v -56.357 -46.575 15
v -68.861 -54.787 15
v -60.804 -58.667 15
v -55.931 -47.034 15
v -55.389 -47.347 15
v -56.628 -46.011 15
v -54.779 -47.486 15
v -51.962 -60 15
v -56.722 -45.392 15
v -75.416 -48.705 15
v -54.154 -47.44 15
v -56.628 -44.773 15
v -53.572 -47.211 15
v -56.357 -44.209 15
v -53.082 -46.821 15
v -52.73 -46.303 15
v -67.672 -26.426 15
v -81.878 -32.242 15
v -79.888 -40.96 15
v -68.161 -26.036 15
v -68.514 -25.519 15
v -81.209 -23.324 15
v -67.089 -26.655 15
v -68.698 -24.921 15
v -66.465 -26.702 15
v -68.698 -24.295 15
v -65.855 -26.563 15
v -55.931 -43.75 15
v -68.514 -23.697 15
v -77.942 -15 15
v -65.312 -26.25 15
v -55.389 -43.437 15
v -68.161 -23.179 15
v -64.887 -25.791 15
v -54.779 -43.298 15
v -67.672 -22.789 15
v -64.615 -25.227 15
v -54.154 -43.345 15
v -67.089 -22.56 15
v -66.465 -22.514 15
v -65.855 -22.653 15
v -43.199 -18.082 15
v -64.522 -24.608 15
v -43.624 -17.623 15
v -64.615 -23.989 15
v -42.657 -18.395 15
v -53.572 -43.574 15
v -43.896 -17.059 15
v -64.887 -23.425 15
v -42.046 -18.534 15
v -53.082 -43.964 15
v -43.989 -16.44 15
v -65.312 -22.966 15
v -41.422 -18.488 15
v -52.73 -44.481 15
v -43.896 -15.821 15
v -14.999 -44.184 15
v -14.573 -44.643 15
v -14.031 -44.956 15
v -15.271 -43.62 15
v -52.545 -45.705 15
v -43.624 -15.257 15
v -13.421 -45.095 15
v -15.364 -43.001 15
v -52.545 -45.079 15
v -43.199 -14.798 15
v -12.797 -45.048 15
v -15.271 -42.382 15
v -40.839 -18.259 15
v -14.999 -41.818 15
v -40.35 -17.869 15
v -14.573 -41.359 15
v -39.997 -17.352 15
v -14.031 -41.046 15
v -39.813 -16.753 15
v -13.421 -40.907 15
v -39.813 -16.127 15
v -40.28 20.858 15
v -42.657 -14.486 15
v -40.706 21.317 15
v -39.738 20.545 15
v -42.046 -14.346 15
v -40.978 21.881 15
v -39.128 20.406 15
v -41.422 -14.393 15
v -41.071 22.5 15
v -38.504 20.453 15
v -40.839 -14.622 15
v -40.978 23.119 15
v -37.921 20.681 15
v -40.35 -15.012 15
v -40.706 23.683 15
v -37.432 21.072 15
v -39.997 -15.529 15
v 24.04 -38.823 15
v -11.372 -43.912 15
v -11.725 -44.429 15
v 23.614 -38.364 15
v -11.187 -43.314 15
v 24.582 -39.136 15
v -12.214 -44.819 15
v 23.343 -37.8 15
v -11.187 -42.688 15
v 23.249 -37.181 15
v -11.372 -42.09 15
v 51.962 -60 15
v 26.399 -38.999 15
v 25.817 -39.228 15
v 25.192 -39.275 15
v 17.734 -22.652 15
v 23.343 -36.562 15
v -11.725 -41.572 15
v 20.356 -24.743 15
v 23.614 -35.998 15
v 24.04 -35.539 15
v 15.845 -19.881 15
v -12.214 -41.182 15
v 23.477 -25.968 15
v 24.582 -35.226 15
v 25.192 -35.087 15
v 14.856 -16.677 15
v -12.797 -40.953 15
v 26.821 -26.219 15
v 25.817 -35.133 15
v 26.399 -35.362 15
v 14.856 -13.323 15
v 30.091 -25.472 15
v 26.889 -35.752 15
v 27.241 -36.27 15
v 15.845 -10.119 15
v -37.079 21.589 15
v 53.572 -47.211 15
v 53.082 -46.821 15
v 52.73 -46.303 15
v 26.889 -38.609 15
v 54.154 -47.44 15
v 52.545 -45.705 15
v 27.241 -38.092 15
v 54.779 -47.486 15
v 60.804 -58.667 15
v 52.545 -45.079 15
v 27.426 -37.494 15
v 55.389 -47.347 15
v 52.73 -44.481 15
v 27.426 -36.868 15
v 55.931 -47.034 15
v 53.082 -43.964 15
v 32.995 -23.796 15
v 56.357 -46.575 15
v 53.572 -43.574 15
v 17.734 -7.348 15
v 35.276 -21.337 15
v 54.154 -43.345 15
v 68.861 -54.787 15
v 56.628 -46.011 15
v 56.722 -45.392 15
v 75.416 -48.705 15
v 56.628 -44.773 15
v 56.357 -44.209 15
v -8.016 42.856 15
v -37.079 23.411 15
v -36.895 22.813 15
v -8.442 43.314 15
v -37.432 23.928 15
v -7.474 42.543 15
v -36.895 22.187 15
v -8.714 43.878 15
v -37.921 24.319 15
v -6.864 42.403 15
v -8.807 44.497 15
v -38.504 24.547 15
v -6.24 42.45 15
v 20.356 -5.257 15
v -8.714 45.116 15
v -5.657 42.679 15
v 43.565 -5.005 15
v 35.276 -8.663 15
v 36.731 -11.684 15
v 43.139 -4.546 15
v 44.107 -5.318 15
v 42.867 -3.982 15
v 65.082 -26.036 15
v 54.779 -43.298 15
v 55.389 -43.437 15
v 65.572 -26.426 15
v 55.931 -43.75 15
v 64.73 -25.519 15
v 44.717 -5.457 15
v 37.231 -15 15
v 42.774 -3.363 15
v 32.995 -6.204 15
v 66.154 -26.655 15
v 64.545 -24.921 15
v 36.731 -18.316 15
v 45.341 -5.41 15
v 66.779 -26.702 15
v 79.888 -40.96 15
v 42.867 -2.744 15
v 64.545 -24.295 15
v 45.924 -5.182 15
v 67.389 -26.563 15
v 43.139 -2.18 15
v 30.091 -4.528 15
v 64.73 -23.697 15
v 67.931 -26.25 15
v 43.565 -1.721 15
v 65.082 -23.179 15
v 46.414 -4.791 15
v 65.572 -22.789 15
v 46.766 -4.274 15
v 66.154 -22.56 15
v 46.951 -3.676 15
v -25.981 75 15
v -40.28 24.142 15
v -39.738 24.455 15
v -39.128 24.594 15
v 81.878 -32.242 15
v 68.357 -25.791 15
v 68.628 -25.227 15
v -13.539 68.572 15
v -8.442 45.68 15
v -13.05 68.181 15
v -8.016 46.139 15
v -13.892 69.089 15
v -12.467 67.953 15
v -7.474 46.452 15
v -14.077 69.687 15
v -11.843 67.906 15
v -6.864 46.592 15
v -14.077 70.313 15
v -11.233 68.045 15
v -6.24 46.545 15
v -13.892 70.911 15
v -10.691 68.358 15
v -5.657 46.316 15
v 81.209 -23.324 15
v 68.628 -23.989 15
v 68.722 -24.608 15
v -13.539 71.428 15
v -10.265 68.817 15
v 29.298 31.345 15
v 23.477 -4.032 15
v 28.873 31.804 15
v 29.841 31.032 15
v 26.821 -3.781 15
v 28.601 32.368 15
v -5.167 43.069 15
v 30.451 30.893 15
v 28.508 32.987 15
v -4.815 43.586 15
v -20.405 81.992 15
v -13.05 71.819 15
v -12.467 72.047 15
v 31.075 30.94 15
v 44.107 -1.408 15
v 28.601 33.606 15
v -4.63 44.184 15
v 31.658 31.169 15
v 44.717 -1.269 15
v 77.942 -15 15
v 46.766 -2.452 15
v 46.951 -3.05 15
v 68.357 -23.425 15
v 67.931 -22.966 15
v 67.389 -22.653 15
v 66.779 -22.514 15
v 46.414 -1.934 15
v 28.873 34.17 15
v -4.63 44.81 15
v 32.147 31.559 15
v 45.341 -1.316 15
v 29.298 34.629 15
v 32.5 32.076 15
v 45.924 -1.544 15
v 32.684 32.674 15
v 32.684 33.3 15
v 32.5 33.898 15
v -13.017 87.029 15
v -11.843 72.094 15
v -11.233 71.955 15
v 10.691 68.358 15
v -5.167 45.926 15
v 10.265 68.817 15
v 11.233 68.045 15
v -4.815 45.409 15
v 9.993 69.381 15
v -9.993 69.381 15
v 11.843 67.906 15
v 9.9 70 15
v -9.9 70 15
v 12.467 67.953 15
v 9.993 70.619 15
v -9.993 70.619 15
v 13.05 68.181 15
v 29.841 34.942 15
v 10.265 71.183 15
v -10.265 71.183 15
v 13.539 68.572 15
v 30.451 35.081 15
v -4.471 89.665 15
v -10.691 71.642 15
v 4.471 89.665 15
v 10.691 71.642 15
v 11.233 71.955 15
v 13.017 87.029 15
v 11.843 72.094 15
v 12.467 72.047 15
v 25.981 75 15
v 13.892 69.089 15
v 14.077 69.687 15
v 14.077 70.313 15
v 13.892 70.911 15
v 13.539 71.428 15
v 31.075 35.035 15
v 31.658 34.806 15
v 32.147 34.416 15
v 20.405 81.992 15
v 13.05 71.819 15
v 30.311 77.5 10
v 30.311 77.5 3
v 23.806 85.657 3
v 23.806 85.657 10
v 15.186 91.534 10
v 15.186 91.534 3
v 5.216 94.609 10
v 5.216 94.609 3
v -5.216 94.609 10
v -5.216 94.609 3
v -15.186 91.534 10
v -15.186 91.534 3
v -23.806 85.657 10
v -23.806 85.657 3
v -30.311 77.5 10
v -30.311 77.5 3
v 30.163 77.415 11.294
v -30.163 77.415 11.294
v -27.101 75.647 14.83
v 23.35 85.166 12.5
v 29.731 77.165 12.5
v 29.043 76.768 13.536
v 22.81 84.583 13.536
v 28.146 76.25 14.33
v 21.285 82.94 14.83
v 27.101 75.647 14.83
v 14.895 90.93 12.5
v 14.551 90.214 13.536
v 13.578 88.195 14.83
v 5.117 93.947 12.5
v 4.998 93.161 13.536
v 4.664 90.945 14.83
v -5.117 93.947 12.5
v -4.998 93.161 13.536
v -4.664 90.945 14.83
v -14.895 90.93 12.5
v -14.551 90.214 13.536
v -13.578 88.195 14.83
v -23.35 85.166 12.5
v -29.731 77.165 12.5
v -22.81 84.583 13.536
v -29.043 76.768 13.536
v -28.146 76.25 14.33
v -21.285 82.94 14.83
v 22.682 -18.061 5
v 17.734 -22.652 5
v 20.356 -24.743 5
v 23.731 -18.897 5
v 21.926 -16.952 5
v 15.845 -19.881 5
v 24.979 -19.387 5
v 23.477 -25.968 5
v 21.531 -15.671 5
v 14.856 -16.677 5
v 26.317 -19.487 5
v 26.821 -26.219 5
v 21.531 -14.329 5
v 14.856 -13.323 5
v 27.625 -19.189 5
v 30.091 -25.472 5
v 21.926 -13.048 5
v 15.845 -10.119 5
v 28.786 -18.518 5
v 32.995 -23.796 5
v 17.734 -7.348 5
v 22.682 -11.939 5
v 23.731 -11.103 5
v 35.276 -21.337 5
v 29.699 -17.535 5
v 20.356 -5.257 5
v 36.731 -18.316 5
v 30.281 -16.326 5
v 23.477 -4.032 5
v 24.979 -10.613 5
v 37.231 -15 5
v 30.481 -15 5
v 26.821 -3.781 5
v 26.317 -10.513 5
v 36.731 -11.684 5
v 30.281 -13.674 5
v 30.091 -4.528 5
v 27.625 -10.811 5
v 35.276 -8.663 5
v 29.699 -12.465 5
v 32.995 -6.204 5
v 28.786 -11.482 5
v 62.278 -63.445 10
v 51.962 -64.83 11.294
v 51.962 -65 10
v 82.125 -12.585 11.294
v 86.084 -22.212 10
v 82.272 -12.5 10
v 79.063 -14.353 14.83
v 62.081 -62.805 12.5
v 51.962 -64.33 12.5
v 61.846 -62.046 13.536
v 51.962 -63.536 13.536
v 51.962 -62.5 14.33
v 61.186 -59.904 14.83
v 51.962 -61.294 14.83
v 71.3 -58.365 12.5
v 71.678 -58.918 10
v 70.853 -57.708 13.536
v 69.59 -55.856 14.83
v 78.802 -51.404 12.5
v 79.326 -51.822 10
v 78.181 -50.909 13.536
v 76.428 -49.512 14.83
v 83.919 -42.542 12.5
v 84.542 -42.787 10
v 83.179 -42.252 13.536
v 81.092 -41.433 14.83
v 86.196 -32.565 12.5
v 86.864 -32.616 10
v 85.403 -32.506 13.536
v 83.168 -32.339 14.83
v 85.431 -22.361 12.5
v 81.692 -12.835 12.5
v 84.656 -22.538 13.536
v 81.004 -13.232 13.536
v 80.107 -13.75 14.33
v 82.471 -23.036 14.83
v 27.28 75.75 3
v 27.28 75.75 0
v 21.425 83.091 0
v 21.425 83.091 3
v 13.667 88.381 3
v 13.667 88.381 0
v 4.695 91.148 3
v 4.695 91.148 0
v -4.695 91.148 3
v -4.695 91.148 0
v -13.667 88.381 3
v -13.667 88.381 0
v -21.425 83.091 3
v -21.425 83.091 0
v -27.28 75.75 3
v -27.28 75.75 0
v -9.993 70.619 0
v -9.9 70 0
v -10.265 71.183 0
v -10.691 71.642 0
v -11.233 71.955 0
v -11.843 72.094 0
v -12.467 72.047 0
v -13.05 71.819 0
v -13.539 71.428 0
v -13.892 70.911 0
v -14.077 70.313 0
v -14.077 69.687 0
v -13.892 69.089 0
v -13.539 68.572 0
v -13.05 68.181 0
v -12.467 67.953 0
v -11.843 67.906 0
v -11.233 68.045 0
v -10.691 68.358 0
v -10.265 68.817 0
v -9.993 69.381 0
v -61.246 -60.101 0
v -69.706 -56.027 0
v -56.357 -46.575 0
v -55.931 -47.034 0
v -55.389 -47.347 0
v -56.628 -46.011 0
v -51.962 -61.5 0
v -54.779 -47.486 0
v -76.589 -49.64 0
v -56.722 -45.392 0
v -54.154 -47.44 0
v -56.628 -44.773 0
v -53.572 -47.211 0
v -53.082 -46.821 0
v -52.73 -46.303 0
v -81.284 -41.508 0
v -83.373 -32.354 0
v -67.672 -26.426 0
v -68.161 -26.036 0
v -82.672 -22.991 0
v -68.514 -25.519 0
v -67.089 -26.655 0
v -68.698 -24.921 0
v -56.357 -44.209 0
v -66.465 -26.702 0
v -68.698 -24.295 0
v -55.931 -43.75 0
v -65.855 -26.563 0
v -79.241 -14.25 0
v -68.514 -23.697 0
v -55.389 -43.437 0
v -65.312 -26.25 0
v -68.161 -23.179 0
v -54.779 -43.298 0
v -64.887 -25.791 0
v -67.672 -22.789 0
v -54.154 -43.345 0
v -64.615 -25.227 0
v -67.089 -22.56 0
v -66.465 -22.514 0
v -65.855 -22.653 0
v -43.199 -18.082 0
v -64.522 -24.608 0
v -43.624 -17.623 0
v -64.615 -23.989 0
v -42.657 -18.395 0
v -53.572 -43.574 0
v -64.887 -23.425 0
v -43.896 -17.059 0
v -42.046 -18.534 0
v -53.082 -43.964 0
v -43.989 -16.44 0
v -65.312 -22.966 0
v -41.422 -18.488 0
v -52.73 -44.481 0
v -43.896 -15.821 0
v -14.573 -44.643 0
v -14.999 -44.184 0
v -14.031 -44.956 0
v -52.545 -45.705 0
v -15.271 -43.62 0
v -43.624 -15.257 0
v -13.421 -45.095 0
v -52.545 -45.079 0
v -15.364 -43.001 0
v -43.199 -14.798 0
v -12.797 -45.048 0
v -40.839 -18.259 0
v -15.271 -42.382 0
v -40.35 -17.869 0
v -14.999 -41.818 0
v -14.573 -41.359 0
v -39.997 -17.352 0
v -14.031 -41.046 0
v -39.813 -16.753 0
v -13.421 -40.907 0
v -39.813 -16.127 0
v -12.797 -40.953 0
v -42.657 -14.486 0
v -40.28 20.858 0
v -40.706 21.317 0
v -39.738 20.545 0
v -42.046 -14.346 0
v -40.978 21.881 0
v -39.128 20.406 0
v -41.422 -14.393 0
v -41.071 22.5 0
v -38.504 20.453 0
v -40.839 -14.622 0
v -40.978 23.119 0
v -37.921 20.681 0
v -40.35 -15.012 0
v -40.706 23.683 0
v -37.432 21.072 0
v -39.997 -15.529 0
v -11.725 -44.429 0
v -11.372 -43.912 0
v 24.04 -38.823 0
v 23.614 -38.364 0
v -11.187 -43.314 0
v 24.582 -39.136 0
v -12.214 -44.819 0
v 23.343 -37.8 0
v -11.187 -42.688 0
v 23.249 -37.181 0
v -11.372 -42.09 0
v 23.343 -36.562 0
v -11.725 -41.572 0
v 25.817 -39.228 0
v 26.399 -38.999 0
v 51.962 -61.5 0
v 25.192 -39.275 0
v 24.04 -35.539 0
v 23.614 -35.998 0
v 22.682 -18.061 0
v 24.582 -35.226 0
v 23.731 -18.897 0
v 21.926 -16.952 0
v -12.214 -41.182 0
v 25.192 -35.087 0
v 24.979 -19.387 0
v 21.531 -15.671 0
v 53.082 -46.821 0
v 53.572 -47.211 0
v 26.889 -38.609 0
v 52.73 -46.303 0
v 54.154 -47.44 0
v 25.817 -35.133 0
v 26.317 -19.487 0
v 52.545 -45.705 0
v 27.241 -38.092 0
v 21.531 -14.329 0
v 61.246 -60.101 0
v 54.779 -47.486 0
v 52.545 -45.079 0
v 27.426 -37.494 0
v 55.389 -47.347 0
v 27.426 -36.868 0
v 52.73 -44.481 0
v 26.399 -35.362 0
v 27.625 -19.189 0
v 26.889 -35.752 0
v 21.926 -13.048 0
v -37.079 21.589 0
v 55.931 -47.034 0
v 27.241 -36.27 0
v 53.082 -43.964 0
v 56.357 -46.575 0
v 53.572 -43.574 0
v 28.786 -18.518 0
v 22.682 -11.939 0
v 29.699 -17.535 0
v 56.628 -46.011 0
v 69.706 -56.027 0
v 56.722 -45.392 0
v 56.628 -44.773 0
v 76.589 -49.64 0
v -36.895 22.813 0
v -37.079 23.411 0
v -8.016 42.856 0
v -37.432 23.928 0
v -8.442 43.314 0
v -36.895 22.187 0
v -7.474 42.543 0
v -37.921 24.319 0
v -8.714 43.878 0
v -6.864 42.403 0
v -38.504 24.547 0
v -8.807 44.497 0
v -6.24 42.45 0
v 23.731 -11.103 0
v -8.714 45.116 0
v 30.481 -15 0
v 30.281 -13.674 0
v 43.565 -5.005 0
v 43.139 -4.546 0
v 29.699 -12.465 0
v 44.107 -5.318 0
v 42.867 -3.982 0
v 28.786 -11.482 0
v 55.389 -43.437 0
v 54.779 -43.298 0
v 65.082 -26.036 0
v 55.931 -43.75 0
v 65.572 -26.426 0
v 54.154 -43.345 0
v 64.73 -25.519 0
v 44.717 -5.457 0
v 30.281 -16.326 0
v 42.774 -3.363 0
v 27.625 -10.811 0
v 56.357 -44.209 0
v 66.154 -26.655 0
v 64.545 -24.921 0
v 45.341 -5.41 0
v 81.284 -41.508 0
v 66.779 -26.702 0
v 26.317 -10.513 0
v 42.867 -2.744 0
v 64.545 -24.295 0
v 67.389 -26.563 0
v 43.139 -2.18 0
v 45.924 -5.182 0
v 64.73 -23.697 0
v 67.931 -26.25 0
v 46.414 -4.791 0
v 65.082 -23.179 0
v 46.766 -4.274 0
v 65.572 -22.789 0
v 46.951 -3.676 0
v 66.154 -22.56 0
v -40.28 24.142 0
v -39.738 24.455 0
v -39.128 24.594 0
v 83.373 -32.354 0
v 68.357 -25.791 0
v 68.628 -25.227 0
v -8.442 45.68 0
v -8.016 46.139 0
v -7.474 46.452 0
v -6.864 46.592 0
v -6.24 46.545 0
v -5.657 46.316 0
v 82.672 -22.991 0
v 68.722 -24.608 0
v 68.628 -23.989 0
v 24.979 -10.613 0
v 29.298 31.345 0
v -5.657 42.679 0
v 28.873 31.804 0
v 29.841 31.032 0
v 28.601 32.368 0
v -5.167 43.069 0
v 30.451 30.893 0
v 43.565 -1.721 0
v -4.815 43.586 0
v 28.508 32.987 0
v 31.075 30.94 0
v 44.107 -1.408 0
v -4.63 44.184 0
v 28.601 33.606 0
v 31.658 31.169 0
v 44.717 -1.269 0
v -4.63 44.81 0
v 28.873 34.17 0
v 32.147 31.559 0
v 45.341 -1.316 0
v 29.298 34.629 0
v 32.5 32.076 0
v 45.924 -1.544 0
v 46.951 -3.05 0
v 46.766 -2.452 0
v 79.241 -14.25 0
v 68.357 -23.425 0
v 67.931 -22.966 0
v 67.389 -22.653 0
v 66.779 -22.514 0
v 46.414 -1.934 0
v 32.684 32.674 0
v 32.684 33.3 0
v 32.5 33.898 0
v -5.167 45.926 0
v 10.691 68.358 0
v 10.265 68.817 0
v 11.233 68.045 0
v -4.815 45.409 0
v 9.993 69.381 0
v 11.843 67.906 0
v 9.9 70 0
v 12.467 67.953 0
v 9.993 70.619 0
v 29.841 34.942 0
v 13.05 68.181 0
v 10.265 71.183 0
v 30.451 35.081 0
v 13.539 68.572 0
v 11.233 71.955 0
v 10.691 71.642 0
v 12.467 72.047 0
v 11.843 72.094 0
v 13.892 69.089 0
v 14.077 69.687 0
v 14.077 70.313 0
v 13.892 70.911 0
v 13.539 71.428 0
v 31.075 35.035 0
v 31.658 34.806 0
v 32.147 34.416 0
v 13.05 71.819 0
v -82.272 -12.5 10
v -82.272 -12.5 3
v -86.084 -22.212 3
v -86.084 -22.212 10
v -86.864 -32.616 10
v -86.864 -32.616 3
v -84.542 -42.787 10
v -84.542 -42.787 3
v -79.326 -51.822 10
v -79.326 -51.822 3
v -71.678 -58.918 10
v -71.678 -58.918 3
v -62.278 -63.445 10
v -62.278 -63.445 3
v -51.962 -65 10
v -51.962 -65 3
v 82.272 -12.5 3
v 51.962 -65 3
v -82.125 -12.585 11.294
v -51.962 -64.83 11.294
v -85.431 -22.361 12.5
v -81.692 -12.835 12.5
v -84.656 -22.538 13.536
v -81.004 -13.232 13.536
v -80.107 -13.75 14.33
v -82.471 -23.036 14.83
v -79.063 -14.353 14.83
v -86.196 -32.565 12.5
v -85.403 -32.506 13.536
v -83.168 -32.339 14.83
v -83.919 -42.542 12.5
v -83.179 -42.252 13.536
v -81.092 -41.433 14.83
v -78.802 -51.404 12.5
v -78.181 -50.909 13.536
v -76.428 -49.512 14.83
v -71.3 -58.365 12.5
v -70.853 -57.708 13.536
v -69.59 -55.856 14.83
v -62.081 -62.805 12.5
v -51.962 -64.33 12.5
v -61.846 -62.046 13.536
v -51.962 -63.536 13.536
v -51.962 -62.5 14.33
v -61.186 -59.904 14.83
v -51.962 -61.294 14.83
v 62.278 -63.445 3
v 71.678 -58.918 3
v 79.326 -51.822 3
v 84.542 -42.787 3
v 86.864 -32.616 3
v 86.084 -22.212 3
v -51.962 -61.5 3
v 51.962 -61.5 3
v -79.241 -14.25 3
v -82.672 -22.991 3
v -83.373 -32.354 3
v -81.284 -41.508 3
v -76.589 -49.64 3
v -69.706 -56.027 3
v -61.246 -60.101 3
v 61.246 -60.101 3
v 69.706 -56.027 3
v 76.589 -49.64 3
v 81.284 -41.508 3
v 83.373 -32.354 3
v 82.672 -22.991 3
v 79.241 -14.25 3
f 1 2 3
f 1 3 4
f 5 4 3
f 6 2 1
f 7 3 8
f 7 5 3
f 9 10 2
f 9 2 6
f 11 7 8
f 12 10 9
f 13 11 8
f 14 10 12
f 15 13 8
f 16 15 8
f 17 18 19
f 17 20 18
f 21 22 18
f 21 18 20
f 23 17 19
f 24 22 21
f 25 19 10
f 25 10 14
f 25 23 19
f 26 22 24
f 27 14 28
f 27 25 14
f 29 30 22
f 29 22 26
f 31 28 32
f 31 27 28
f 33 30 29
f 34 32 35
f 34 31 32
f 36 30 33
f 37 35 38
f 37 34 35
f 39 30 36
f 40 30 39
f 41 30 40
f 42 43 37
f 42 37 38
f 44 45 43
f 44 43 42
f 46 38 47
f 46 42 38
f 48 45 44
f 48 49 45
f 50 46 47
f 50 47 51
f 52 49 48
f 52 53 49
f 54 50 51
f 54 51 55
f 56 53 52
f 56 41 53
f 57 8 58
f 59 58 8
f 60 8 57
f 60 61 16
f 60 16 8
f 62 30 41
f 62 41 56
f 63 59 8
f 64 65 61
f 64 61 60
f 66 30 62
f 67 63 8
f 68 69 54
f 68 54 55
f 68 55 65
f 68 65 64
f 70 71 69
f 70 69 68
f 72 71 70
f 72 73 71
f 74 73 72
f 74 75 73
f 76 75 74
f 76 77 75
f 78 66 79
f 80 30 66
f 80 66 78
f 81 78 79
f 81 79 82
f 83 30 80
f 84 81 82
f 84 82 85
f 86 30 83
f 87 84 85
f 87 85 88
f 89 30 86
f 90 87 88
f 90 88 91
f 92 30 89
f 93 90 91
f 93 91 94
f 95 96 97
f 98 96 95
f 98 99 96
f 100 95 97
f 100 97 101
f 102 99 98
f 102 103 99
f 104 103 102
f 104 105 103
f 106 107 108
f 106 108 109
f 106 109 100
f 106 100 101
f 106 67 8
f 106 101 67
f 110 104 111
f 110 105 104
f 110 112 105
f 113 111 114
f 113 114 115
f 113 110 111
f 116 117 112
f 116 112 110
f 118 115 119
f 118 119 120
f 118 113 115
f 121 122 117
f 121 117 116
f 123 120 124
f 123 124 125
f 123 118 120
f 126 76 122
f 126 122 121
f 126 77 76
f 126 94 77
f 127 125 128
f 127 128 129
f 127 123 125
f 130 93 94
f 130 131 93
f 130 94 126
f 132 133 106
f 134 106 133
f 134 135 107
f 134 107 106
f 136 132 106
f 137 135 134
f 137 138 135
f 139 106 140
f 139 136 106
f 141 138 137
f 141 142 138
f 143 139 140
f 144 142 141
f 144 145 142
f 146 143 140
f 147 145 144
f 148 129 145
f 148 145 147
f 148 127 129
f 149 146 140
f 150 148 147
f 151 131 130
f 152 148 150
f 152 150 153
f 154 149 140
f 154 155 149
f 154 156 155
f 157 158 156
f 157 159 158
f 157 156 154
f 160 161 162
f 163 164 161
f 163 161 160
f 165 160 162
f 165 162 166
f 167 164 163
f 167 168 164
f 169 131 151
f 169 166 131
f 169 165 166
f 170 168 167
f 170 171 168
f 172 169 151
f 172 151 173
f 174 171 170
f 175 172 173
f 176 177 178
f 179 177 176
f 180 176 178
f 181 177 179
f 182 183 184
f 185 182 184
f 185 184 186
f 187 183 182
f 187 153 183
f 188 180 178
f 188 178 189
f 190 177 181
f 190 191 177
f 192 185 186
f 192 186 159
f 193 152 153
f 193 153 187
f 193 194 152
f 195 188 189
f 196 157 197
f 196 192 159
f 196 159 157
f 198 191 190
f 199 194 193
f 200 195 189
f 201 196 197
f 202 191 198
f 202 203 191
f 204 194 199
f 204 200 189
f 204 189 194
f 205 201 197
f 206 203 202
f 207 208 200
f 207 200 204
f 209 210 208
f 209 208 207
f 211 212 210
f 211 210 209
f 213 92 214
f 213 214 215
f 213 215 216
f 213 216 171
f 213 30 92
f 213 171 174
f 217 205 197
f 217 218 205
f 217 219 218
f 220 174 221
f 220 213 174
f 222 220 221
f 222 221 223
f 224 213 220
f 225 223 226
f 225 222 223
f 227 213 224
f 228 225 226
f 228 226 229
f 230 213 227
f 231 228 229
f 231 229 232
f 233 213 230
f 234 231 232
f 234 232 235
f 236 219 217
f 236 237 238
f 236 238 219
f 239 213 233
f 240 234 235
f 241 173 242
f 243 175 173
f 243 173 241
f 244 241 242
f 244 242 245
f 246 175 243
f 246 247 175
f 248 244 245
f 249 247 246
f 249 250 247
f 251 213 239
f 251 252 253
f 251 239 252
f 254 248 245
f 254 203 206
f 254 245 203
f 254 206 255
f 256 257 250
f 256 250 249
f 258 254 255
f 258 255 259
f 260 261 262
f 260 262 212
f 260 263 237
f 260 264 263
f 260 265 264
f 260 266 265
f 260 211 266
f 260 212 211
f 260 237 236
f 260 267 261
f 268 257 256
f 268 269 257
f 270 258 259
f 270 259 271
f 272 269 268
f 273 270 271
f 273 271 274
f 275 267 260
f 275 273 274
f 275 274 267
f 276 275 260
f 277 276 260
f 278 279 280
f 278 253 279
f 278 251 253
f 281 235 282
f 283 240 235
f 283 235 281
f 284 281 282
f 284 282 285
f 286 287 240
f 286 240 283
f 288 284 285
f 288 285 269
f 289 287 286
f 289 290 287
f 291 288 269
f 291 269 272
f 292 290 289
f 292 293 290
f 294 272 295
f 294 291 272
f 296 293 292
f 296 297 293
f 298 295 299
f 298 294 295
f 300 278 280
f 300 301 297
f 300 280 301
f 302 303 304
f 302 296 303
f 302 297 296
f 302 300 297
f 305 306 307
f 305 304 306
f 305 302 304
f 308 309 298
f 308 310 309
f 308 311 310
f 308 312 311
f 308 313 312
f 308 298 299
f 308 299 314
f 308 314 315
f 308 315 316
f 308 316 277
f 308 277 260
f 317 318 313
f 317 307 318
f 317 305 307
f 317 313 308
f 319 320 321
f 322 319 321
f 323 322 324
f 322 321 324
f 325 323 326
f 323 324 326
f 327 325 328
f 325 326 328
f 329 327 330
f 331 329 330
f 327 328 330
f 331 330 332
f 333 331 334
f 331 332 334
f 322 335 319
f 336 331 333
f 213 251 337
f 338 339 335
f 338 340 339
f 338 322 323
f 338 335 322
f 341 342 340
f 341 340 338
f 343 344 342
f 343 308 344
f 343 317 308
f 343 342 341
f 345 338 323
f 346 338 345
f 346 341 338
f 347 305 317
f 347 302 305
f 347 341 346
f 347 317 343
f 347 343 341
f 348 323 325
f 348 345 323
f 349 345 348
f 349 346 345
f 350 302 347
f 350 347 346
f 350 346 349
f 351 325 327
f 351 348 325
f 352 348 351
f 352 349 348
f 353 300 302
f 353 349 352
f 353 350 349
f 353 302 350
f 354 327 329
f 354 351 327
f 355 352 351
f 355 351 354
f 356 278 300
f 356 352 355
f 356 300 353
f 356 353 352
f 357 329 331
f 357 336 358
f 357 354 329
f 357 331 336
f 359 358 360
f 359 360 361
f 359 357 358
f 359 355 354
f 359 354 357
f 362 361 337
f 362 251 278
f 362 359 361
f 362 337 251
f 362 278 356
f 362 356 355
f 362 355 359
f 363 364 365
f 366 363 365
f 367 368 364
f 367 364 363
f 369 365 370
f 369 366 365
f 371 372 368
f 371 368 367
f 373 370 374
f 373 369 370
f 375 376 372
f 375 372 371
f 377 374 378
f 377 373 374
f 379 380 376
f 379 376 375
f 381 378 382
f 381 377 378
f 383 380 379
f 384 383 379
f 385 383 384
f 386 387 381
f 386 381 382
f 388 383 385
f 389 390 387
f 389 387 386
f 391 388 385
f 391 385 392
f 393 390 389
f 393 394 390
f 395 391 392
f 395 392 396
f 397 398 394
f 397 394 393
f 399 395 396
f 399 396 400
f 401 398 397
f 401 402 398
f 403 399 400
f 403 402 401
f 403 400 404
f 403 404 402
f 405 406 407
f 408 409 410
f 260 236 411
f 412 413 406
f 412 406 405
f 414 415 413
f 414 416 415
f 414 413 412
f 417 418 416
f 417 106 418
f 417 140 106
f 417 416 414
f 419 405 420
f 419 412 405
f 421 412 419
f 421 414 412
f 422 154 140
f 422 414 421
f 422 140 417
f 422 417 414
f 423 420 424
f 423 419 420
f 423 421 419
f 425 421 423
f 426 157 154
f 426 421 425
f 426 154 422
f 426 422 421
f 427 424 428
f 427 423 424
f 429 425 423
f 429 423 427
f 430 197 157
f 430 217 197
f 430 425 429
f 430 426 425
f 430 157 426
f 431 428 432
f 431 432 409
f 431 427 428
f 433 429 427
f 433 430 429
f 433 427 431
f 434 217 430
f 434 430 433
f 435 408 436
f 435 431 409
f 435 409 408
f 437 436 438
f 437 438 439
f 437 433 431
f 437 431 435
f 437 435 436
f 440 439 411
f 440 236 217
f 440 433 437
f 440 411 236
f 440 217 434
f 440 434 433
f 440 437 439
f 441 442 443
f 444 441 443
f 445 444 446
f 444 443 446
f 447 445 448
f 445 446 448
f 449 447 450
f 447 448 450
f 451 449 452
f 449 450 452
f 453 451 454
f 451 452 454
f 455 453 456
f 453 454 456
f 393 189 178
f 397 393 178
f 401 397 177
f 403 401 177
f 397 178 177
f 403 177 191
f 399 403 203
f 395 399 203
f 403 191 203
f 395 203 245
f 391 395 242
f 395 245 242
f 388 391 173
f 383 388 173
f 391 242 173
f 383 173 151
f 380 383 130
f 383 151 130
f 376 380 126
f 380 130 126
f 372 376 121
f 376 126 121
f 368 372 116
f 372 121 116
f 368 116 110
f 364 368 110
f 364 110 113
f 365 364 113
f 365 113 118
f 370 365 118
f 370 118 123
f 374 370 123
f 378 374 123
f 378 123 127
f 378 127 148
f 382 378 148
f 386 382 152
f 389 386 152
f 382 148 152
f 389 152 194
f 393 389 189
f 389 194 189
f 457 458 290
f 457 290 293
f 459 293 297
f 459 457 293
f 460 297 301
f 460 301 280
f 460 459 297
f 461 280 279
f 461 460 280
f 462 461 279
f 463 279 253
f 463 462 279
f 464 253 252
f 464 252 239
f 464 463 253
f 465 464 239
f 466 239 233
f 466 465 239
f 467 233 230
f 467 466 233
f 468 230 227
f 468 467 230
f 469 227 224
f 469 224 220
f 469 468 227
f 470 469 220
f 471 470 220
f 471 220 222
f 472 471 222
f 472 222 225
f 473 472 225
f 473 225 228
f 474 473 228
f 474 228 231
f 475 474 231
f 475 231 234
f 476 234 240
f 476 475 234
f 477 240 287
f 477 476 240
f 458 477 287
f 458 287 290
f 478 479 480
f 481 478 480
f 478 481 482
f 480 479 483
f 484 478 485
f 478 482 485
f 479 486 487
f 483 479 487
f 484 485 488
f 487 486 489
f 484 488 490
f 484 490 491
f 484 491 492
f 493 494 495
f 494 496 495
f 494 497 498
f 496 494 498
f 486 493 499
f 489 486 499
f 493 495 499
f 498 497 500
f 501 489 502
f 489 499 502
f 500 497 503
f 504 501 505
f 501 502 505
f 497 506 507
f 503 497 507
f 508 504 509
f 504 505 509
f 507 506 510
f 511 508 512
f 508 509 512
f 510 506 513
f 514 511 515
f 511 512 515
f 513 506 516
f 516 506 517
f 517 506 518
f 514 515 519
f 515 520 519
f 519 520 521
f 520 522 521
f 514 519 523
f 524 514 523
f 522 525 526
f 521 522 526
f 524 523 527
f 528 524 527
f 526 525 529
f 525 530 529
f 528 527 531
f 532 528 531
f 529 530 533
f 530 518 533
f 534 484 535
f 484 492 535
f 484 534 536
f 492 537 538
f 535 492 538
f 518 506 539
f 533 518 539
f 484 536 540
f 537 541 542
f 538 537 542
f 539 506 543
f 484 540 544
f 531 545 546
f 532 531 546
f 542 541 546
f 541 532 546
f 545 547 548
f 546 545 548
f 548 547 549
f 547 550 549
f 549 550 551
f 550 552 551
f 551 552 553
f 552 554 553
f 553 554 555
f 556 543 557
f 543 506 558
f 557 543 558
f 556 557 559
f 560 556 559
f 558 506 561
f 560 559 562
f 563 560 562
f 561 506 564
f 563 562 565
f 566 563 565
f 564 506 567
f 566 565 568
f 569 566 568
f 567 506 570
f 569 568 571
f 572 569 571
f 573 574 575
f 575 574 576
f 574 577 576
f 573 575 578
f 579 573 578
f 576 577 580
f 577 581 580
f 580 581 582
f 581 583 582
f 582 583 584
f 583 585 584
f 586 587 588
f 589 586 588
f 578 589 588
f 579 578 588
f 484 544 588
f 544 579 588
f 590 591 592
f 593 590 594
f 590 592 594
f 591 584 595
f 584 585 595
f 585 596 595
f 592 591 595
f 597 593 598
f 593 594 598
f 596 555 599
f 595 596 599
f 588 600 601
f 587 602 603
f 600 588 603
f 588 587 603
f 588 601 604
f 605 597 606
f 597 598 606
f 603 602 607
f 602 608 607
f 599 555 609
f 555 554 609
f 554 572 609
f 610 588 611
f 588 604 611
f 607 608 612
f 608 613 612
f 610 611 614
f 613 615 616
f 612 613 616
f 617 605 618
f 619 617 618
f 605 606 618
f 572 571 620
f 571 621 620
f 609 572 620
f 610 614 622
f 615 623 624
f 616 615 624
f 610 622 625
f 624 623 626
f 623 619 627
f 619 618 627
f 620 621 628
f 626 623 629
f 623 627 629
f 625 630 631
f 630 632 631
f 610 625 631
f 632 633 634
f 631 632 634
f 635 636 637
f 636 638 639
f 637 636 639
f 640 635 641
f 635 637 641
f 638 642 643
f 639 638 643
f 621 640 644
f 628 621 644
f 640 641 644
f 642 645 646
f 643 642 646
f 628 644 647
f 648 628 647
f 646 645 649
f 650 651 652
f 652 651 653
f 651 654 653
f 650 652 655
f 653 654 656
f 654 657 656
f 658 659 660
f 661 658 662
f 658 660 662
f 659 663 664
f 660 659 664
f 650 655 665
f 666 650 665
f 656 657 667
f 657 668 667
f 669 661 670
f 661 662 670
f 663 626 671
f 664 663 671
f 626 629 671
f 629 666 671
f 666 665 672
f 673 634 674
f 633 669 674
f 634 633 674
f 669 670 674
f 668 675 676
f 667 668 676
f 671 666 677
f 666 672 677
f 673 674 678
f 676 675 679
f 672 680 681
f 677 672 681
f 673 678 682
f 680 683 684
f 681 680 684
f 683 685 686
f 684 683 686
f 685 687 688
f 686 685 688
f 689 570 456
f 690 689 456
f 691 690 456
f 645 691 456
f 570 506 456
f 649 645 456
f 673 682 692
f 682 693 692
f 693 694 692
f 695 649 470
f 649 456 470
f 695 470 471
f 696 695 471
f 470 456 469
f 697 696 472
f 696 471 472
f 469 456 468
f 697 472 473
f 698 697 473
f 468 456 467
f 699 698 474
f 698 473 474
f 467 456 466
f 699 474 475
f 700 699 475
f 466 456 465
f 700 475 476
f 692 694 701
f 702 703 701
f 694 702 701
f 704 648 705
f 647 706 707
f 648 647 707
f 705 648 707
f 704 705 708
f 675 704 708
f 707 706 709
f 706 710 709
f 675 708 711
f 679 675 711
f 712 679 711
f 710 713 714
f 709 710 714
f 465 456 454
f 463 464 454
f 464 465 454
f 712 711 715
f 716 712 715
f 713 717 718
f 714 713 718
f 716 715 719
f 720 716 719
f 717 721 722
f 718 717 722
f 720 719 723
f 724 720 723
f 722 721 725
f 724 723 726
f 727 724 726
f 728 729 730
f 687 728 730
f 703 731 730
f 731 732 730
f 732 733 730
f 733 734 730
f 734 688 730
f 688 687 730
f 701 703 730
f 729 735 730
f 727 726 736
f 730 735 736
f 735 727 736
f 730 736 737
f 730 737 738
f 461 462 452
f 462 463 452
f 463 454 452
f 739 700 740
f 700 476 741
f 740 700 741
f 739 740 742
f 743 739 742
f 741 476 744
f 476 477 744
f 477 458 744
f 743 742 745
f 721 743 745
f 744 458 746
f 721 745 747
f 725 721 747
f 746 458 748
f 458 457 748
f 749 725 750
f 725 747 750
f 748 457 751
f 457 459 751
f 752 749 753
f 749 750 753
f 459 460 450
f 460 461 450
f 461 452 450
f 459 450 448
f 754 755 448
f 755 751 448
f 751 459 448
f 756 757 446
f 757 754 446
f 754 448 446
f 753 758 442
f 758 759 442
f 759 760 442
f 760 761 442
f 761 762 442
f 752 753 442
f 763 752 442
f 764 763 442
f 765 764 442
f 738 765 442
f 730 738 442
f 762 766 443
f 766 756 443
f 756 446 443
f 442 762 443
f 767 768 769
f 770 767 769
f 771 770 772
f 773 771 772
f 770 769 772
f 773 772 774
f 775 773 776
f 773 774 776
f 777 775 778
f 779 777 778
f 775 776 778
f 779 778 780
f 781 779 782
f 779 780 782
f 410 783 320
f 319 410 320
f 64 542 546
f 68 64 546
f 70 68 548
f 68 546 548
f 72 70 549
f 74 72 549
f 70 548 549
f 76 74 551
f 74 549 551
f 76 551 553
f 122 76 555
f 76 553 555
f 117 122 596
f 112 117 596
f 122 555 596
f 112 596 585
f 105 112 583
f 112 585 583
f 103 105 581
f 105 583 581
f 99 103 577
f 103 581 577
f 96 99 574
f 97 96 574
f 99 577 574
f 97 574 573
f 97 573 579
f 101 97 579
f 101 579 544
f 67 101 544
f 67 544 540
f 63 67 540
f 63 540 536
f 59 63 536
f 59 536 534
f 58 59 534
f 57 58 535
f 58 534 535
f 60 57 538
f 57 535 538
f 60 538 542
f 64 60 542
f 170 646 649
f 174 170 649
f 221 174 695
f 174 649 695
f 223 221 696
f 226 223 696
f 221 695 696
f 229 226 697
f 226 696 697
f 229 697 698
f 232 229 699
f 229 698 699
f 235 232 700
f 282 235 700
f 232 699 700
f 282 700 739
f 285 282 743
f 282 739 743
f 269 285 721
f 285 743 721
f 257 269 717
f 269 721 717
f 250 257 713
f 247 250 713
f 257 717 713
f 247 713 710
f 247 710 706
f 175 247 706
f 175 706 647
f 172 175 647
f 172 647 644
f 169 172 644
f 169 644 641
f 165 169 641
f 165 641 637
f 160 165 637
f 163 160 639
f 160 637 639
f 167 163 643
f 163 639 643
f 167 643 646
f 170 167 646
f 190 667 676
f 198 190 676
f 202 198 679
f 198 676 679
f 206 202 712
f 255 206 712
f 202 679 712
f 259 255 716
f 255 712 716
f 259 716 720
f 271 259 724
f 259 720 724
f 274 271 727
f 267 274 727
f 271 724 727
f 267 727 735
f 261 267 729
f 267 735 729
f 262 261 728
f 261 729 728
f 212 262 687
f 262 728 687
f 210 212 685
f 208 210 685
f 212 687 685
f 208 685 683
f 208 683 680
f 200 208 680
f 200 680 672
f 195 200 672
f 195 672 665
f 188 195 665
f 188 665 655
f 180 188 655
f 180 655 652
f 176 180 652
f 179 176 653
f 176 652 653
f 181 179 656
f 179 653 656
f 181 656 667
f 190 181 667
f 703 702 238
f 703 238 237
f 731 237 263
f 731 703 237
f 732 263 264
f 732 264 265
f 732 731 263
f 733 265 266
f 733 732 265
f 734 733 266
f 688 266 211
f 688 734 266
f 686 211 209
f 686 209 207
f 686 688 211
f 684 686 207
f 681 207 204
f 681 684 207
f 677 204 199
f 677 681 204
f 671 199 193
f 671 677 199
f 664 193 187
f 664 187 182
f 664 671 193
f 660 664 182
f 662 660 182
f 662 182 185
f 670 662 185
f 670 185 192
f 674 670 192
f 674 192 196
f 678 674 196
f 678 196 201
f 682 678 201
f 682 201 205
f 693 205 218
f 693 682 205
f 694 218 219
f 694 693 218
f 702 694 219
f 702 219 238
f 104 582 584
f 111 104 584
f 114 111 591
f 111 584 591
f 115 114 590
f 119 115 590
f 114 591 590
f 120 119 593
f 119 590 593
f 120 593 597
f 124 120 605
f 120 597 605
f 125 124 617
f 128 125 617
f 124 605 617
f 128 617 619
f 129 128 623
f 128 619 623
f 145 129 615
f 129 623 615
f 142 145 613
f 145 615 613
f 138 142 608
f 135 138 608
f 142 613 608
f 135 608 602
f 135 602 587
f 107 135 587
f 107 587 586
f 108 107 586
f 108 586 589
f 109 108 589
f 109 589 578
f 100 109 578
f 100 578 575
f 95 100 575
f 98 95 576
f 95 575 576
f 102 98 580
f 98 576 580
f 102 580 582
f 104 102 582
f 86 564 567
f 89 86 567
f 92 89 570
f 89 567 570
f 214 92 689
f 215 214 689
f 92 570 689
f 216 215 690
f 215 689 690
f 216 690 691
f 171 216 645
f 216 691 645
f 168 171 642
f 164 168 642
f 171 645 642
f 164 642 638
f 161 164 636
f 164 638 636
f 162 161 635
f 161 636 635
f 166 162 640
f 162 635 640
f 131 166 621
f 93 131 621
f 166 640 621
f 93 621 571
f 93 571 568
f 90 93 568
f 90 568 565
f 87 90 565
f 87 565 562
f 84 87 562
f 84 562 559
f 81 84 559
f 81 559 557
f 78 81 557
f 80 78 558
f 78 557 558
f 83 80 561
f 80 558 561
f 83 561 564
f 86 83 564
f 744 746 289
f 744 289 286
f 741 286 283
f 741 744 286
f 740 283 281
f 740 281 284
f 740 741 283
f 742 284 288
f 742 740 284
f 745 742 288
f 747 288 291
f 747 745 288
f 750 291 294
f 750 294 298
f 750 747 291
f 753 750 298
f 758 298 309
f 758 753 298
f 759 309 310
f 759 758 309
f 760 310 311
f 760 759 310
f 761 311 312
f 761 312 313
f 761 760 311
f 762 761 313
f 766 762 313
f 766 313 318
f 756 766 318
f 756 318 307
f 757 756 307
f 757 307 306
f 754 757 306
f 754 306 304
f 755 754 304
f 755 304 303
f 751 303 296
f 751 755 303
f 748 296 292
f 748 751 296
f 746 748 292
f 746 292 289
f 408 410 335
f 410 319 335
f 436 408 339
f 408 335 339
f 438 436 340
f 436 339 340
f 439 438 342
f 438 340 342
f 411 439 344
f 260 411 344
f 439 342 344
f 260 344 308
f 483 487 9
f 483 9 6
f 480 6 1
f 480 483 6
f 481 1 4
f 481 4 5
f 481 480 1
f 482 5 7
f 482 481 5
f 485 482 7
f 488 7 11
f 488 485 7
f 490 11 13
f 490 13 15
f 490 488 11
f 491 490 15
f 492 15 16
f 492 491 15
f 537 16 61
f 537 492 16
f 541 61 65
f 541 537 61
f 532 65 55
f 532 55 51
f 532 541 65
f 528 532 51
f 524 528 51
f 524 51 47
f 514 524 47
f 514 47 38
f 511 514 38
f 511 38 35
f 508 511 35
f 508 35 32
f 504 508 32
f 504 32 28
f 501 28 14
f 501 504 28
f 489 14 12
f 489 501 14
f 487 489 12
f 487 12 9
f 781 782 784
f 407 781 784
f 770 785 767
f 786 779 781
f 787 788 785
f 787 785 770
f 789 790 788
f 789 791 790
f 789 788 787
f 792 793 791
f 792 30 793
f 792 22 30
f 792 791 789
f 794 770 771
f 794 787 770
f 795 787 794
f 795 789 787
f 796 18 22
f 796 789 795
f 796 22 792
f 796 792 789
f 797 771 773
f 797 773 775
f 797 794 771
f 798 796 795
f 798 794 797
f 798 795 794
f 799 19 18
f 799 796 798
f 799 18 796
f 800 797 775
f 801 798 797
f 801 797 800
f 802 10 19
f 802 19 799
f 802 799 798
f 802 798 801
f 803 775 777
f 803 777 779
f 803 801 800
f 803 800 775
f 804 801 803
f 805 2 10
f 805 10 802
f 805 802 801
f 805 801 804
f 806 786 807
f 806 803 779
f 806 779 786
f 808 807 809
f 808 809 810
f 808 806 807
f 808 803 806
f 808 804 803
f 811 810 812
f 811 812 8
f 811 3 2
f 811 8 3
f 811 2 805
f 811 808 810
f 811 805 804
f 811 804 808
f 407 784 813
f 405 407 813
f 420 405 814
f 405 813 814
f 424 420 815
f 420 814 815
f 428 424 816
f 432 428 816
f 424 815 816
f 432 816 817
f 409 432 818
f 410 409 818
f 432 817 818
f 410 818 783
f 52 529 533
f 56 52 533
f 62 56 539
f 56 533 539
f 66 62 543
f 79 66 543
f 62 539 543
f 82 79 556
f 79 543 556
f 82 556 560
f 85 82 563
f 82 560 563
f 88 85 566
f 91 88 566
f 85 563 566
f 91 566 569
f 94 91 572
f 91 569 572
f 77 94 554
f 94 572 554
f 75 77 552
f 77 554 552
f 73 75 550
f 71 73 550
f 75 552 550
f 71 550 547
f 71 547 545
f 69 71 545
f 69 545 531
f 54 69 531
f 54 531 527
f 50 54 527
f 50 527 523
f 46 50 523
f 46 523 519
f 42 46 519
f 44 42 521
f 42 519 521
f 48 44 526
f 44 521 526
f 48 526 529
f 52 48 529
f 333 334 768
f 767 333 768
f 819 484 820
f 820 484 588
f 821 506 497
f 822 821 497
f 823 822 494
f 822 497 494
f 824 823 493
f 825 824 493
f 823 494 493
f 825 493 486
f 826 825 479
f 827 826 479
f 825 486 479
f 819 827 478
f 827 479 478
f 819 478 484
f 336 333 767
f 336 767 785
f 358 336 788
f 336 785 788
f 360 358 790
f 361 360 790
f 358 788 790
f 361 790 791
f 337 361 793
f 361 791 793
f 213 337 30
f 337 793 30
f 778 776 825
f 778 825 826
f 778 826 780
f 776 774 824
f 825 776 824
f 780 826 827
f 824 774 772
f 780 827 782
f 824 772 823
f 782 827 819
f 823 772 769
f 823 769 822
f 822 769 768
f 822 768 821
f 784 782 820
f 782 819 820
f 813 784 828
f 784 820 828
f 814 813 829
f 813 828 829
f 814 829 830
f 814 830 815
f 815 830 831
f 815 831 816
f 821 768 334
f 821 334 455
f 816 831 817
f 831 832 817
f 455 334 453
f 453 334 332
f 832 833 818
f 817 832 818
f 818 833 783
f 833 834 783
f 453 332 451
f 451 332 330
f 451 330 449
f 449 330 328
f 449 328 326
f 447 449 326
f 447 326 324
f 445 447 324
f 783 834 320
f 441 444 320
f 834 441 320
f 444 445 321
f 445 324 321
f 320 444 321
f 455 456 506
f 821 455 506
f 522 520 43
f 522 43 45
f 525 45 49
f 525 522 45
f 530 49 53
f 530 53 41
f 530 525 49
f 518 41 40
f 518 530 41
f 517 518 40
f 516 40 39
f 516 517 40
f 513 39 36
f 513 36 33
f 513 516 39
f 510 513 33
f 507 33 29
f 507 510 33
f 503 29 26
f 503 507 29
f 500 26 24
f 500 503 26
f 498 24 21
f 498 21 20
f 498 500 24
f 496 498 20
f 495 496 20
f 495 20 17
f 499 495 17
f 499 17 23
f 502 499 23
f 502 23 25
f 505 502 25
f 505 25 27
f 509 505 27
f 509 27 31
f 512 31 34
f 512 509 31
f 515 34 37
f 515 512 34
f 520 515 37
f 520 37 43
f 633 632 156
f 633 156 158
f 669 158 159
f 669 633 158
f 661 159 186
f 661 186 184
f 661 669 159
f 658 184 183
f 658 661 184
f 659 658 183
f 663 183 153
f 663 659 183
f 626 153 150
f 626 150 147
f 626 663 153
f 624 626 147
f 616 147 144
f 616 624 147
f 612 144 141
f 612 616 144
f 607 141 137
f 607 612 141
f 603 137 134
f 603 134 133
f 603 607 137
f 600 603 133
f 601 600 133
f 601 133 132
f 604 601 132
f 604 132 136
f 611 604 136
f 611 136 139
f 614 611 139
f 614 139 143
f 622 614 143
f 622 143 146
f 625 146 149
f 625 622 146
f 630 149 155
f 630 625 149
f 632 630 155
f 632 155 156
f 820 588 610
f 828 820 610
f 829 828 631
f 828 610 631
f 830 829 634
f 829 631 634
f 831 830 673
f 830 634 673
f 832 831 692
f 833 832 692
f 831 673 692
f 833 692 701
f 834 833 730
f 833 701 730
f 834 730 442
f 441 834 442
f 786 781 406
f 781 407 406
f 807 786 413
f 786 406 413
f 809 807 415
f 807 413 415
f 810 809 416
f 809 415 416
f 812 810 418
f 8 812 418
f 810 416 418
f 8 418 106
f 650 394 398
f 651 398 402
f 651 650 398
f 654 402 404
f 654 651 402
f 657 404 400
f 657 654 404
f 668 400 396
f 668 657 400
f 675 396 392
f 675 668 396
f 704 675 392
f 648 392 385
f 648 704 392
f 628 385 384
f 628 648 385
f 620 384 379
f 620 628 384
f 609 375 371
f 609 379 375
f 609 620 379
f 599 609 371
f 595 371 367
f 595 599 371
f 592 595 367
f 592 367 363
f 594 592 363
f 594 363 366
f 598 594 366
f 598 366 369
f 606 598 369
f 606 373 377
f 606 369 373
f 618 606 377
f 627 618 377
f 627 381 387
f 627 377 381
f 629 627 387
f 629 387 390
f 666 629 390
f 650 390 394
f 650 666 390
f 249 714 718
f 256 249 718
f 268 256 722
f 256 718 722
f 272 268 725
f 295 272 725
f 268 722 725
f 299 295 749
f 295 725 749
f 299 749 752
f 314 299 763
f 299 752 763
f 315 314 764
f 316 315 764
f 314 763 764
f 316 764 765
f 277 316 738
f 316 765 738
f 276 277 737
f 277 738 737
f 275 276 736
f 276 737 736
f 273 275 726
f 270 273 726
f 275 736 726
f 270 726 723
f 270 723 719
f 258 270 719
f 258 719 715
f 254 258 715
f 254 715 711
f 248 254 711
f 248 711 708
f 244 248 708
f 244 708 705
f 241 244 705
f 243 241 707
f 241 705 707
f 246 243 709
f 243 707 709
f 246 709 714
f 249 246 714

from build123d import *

# Parameters (mm, degrees)
ESBO_O1_R                = 2.1
ESBO_O1_R_2              = 4.5
RESSALTO_EXTRUS_O1_DEPTH = 15
ESBO_O2_R                = 2.1
CORTE_EXTRUS_O1_DEPTH    = 15
CORTE_EXTRUS_O2_DEPTH    = 3
ESBO_O5_R                = 11.25
CORTE_EXTRUS_O3_DEPTH    = 10
FILETE1_R                = 5


with BuildPart() as part:
    # Esboço1 → Ressalto-extrusão1 (new body)
    with BuildSketch(Plane.XY):
        with BuildLine():
            Line((-30.310889132, 77.5), (-82.27241336, -12.5))
            ThreePointArc((-82.27241336, -12.5), (-82.27241336, -47.5), (-51.961524227, -65))
            Line((-51.961524227, -65), (51.961524227, -65))
            ThreePointArc((51.961524227, -65), (82.27241336, -47.5), (82.27241336, -12.5))
            Line((82.27241336, -12.5), (30.310889132, 77.5))
            ThreePointArc((30.310889132, 77.5), (0, 95), (-30.310889132, 77.5))
        make_face()
        with Locations((-12, 70)):
            Circle(ESBO_O1_R, mode=Mode.SUBTRACT)
        with Locations((-66.621778265, -24.607695155)):
            Circle(ESBO_O1_R, mode=Mode.SUBTRACT)
        with Locations(Location((12, 70, 0), (0, 0, 180))):
            Circle(ESBO_O1_R, mode=Mode.SUBTRACT)
        with Locations(Location((-54.621778265, -45.392304845, 0), (0, 0, 180))):
            Circle(ESBO_O1_R, mode=Mode.SUBTRACT)
        with Locations((66.621778265, -24.607695155)):
            Circle(ESBO_O1_R, mode=Mode.SUBTRACT)
        with Locations((54.621778265, -45.392304845)):
            Circle(ESBO_O1_R, mode=Mode.SUBTRACT)
        with Locations((25.980762114, -15)):
            Circle(ESBO_O1_R_2, mode=Mode.SUBTRACT)
    extrude(amount=RESSALTO_EXTRUS_O1_DEPTH)

    # Esboço2 → Corte-extrusão1 (cut)
    with BuildSketch(Plane(origin=(0, 0, 0), x_dir=(-1, 0, 0), z_dir=(0, 0, -1))):
        with Locations((38.97114317, 22.5)):
            Circle(ESBO_O2_R)
        with Locations((41.889318689, -16.440346096)):
            Circle(ESBO_O2_R)
        with Locations((13.263982849, -43.00077626)):
            Circle(ESBO_O2_R)
        with Locations((-25.349402613, -37.180744844)):
            Circle(ESBO_O2_R)
        with Locations((-44.874170873, -3.362854211)):
            Circle(ESBO_O2_R)
        with Locations((-30.6077732, 32.987334232)):
            Circle(ESBO_O2_R)
        with Locations((6.706901978, 44.49738718)):
            Circle(ESBO_O2_R)
    extrude(amount=-CORTE_EXTRUS_O1_DEPTH, mode=Mode.SUBTRACT)

    # Esboço4 → Corte-extrusão2 (cut)
    with BuildSketch(Plane(origin=(0, 0, 0), x_dir=(-1, 0, 0), z_dir=(0, 0, -1))):
        with BuildLine():
            Line((51.961524227, -65), (-51.961524227, -65))
            ThreePointArc((-51.961524227, -65), (-82.27241336, -47.5), (-82.27241336, -12.5))
            Line((-82.27241336, -12.5), (-30.310889132, 77.5))
            ThreePointArc((-30.310889132, 77.5), (0, 95), (30.310889132, 77.5))
            Line((30.310889132, 77.5), (82.27241336, -12.5))
            ThreePointArc((82.27241336, -12.5), (82.27241336, -47.5), (51.961524227, -65))
        make_face()
        with BuildLine():
            Line((51.961524227, -61.5), (-51.961524227, -61.5))
            ThreePointArc((-51.961524227, -61.5), (-79.241324446, -45.75), (-79.241324446, -14.25))
            Line((-79.241324446, -14.25), (-27.279800219, 75.75))
            ThreePointArc((-27.279800219, 75.75), (0, 91.5), (27.279800219, 75.75))
            Line((27.279800219, 75.75), (79.241324446, -14.25))
            ThreePointArc((79.241324446, -14.25), (79.241324446, -45.75), (51.961524227, -61.5))
        make_face(mode=Mode.SUBTRACT)
    extrude(amount=-CORTE_EXTRUS_O2_DEPTH, mode=Mode.SUBTRACT)

    # Esboço5 → Corte-extrusão3 (cut)
    with BuildSketch(Plane.XY.offset(15)):
        with Locations((25.980762114, -15)):
            Circle(ESBO_O5_R)
    extrude(amount=-CORTE_EXTRUS_O3_DEPTH, mode=Mode.SUBTRACT)

    # Filete1
    filete1_edges = [part.edges().sort_by_distance(p)[0] for p in [
        (-82.27241336, -47.5, 15),
        (0, -65, 15),
        (82.27241336, -47.5, 15),
        (56.291651246, 32.5, 15),
        (0, 95, 15),
        (-56.291651246, 32.5, 15),
    ]]
    fillet(filete1_edges, radius=FILETE1_R)


solid = part.part
